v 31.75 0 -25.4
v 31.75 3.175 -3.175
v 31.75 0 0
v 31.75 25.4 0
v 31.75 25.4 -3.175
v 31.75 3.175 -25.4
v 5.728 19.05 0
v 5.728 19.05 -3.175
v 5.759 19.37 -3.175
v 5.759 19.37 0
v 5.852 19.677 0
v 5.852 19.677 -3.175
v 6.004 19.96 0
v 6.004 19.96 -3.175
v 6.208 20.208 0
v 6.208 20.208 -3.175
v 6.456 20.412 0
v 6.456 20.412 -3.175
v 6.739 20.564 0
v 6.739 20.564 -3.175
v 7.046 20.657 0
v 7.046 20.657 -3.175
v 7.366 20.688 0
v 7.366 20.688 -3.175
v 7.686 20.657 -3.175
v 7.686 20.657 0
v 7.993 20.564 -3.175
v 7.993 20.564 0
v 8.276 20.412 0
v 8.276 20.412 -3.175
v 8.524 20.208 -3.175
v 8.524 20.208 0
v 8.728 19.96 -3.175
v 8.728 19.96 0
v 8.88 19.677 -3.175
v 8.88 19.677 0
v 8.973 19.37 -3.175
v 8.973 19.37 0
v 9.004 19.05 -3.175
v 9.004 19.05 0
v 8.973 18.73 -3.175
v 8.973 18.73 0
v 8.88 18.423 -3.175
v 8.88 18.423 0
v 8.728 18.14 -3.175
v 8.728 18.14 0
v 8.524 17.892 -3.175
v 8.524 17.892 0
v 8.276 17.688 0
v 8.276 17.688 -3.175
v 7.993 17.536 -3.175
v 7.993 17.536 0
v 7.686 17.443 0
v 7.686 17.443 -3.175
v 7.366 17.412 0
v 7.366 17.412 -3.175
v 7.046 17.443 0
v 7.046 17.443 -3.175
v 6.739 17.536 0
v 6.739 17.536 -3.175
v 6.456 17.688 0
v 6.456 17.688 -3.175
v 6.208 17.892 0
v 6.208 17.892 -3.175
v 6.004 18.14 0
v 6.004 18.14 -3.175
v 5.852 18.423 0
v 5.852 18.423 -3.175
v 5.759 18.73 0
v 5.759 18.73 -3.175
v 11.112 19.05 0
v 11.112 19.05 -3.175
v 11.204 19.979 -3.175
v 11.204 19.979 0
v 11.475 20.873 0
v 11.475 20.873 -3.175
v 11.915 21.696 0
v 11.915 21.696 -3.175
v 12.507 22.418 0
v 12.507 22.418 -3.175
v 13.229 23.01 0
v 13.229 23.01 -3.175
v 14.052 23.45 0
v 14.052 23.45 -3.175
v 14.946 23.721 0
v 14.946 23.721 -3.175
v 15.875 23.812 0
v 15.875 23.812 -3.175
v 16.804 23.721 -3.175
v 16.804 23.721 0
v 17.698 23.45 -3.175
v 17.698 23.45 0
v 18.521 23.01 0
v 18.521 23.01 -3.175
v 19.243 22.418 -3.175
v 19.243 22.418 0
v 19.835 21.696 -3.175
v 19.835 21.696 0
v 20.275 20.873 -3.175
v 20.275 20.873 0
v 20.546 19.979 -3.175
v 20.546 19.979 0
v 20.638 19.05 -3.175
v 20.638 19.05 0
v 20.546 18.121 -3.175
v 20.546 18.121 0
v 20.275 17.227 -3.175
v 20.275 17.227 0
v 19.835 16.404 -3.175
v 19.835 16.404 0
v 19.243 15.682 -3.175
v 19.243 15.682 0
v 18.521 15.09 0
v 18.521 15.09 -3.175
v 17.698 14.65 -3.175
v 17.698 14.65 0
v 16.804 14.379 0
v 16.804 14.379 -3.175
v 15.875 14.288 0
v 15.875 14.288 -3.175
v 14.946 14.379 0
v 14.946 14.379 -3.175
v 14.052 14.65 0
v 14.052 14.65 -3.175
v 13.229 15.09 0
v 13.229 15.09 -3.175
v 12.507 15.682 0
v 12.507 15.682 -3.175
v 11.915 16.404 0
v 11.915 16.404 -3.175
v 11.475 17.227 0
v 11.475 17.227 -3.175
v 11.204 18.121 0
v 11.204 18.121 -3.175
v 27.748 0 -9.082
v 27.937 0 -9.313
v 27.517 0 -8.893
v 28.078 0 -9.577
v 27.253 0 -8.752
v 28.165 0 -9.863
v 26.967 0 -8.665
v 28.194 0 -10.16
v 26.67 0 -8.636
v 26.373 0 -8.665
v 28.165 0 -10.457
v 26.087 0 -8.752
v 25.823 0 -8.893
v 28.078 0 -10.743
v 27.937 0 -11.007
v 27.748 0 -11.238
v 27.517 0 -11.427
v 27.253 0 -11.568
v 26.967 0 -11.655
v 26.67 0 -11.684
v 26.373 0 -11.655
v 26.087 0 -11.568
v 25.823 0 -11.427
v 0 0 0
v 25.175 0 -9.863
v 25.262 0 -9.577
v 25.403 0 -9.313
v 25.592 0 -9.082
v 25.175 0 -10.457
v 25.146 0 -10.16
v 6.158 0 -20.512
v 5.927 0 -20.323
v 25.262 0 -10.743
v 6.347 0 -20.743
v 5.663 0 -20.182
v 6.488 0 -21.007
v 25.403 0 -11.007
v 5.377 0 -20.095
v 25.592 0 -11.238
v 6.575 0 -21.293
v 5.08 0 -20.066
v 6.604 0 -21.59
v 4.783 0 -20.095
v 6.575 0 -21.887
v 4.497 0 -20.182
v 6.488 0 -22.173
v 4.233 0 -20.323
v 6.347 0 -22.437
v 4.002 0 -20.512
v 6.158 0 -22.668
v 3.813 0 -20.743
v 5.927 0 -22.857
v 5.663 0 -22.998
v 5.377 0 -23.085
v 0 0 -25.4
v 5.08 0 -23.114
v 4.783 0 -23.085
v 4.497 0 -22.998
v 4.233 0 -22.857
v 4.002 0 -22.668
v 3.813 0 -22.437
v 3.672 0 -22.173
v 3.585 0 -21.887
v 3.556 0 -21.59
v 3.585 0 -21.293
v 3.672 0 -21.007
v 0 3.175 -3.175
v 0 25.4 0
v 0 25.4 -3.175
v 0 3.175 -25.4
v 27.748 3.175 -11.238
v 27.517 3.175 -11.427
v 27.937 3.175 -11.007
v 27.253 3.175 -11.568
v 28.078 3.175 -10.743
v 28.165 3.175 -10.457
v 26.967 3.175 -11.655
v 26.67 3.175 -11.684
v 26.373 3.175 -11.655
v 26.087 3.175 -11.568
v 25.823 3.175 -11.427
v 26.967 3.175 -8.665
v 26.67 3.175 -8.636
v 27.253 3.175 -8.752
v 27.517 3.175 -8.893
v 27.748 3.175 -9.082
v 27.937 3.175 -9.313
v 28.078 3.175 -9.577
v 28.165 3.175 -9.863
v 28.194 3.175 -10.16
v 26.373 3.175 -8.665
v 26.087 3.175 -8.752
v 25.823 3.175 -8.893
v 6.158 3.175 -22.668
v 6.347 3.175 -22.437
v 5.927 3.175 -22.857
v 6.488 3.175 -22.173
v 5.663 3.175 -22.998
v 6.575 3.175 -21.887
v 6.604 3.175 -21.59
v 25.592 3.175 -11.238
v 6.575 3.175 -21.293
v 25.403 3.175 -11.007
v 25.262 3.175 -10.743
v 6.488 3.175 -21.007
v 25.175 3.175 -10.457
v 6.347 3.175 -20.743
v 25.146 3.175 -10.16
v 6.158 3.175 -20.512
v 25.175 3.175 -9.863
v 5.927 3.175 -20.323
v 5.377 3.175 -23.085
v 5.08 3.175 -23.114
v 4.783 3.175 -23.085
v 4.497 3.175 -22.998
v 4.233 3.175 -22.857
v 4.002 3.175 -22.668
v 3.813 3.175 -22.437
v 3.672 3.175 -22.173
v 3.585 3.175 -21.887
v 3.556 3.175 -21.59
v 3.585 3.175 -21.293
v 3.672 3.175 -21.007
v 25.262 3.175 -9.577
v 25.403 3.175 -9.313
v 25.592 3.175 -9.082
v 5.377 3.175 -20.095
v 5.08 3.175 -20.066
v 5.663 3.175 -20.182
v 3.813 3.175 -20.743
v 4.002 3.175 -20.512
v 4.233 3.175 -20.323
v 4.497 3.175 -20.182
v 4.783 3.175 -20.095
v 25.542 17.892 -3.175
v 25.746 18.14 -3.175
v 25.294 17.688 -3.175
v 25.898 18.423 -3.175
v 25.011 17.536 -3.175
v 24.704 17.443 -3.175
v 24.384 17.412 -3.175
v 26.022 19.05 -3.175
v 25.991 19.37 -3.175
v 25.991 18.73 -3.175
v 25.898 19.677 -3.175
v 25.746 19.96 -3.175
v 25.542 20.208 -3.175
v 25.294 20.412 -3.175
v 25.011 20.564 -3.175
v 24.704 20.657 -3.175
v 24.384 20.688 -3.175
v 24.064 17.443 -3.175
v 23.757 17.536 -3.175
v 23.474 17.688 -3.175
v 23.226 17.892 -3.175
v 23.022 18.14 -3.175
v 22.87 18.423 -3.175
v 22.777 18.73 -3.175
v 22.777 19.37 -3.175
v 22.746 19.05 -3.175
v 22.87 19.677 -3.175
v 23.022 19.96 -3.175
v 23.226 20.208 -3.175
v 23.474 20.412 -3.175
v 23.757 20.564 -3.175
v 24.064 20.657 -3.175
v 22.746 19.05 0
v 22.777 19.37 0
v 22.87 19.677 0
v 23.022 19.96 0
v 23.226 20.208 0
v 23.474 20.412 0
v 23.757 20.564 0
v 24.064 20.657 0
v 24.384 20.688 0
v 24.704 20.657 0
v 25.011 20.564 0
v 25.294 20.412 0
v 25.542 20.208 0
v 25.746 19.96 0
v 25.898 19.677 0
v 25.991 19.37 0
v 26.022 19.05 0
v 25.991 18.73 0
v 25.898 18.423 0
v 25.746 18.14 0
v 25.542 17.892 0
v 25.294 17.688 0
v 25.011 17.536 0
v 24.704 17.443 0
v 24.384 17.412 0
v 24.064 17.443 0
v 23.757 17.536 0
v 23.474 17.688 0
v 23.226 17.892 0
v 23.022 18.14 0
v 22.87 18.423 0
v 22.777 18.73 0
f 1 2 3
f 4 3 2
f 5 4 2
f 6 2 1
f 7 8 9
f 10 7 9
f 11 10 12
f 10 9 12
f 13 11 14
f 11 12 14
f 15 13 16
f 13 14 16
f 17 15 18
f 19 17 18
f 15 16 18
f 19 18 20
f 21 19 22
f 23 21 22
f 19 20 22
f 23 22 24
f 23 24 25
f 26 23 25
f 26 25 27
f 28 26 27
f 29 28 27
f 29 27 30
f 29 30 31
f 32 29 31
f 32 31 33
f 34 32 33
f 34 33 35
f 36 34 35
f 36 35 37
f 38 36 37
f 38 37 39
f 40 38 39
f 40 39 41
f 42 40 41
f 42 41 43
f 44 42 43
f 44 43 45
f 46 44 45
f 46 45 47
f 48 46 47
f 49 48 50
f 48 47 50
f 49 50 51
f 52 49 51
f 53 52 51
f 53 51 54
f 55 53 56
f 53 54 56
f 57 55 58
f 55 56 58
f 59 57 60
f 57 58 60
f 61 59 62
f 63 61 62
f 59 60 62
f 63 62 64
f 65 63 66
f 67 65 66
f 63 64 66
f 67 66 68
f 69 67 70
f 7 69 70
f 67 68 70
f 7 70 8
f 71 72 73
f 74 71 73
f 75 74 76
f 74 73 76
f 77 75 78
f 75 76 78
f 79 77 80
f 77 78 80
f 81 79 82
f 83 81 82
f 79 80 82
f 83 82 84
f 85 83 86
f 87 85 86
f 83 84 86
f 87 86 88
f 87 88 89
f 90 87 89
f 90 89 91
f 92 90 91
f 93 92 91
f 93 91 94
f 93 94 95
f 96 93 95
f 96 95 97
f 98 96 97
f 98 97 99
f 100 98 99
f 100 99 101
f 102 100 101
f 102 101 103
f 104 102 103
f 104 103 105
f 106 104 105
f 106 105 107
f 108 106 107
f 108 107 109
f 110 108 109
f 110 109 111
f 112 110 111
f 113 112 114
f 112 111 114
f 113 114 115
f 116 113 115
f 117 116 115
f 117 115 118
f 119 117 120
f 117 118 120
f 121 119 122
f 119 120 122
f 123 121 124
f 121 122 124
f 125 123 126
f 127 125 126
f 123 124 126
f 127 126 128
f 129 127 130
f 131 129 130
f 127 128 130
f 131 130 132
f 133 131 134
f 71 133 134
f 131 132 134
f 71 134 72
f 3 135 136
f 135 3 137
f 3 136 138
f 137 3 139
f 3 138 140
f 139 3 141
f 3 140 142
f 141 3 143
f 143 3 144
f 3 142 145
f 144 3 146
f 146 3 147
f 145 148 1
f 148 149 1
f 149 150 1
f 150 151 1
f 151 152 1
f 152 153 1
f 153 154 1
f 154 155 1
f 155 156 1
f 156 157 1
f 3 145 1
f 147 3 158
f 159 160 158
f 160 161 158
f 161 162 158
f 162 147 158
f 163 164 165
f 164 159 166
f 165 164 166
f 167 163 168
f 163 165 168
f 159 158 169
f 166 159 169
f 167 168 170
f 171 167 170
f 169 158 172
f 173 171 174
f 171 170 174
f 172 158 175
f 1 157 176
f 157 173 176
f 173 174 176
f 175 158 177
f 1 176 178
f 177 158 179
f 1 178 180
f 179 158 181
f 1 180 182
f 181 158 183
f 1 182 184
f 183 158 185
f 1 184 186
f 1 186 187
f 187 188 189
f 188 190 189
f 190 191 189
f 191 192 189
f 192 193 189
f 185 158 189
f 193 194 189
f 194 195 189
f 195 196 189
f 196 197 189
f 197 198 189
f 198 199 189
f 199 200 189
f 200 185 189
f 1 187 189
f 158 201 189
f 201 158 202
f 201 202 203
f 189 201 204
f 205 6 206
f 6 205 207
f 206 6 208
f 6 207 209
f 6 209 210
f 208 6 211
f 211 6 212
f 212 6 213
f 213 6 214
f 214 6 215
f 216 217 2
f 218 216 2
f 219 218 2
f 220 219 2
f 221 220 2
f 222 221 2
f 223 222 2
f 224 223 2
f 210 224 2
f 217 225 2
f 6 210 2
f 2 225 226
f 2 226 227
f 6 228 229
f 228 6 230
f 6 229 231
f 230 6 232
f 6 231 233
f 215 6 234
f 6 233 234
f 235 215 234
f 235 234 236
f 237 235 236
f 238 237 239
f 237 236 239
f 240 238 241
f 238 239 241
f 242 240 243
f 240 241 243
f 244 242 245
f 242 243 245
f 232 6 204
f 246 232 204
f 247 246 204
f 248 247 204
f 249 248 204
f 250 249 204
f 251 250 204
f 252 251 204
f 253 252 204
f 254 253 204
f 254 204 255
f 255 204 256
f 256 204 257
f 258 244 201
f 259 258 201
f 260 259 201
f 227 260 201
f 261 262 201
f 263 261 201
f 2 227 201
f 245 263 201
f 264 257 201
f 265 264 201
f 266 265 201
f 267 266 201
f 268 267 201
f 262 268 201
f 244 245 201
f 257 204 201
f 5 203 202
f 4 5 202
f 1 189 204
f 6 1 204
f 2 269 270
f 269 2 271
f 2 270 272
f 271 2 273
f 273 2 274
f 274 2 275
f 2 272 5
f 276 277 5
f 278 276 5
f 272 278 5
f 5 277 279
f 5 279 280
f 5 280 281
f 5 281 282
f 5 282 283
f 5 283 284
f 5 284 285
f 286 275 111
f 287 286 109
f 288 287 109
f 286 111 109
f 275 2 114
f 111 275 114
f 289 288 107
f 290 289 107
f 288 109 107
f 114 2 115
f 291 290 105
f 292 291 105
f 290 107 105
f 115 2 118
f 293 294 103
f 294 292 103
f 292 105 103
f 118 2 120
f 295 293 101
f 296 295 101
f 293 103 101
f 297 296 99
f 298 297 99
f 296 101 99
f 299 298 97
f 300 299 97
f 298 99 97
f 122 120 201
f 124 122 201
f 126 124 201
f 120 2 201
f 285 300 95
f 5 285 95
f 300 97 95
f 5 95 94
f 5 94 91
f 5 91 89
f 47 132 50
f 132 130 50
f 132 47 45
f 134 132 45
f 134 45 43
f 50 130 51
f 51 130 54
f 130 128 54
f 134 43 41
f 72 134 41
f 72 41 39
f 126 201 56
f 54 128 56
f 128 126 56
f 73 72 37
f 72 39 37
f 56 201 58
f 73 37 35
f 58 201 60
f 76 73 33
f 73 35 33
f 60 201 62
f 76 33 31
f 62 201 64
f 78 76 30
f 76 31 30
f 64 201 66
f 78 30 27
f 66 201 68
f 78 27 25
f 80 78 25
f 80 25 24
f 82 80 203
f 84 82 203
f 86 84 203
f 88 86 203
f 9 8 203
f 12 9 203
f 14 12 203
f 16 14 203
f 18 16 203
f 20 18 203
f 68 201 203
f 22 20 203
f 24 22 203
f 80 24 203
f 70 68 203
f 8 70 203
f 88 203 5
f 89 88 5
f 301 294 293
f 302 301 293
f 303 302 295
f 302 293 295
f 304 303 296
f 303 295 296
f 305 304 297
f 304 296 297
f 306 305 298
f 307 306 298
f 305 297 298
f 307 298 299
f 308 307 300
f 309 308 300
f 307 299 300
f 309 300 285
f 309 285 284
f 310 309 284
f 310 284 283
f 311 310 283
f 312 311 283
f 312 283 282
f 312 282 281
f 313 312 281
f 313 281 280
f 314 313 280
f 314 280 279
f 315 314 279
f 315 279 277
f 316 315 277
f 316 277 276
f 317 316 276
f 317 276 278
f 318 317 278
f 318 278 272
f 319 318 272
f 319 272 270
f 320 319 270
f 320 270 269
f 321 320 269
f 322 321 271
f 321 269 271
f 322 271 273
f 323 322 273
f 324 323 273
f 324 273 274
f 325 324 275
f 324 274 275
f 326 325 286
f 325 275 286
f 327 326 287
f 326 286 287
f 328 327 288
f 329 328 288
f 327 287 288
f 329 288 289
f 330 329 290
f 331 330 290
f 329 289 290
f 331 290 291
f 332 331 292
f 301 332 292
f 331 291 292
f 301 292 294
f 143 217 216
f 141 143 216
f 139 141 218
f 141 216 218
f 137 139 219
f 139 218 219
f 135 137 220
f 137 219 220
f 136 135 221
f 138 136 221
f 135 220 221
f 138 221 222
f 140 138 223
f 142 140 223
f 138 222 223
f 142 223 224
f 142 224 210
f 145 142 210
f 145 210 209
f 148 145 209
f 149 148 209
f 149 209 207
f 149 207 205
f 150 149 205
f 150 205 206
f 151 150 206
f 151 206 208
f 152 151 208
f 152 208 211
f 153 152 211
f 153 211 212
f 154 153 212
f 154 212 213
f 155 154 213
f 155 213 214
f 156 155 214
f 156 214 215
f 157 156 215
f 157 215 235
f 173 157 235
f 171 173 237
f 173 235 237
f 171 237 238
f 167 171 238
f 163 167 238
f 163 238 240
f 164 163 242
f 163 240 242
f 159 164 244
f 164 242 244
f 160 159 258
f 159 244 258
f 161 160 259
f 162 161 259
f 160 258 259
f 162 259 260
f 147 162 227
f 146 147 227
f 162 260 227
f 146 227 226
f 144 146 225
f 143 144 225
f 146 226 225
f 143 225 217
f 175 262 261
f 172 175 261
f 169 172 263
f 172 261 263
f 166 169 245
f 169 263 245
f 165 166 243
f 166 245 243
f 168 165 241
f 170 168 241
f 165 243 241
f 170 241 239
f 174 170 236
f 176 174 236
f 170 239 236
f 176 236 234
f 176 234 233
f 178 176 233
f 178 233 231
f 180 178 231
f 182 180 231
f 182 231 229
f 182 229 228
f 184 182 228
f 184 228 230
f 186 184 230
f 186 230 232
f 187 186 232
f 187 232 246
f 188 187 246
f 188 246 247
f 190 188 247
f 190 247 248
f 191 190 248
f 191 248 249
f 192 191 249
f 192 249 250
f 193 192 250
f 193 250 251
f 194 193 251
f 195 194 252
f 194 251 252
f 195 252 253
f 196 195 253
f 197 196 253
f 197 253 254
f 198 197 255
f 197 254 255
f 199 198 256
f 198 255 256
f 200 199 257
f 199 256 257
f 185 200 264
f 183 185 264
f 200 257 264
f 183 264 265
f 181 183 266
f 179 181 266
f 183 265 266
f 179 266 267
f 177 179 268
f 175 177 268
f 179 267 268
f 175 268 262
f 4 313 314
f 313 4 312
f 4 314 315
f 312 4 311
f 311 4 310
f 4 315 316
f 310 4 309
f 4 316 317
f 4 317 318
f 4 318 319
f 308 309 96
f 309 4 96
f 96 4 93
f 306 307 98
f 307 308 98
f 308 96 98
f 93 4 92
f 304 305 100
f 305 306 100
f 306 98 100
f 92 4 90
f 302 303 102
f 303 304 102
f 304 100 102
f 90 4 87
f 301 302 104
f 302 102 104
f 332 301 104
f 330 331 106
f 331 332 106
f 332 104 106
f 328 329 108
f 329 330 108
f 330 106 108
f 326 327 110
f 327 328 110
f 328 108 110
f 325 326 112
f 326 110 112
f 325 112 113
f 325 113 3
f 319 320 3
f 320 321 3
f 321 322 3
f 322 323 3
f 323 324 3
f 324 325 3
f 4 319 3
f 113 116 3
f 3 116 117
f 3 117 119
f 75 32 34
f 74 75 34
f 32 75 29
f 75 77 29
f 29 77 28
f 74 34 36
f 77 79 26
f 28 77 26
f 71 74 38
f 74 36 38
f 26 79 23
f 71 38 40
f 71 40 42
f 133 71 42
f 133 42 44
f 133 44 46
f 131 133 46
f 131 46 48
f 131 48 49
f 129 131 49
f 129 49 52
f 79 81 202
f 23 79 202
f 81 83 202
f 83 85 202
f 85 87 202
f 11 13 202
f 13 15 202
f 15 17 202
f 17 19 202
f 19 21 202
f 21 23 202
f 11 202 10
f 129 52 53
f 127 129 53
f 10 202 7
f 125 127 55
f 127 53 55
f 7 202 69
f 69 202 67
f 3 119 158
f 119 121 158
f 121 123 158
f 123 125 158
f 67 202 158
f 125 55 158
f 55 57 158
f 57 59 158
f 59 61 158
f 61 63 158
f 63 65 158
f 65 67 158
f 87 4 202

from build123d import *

# Parameters (mm, degrees)
BOSS_EXTRUDE1_DEPTH = 31.75
SKETCH3_R           = 4.7625
SKETCH3_R_2         = 1.6383
CUT_EXTRUDE1_DEPTH  = 47.337599474
SKETCH4_R           = 1.524
CUT_EXTRUDE2_DEPTH  = 47.337599474


with BuildPart() as part:
    # Sketch2 → Boss-Extrude1 (new body)
    with BuildSketch(Plane(origin=(0, 0, 0), x_dir=(0, 0, -1), z_dir=(1, 0, 0))):
        Polygon((0, 0), (25.4, 0), (25.4, 3.175), (3.175, 3.175), (3.175, 25.4), (0, 25.4), align=None)
    extrude(amount=BOSS_EXTRUDE1_DEPTH)

    # Sketch3 → Cut-Extrude1 (cut, through all)
    with BuildSketch(Plane(origin=(0, 0, -3.175), x_dir=(-1, 0, 0), z_dir=(0, 0, -1))):
        with Locations((-15.875, 19.05)):
            Circle(SKETCH3_R)
        with Locations((-7.366, 19.05)):
            Circle(SKETCH3_R_2)
        with Locations((-24.384, 19.05)):
            Circle(SKETCH3_R_2)
    extrude(amount=-CUT_EXTRUDE1_DEPTH, mode=Mode.SUBTRACT)

    # Sketch4 → Cut-Extrude2 (cut, through all)
    with BuildSketch(Plane(origin=(0, 3.175, 0), x_dir=(1, 0, 0), z_dir=(0, 1, 0))):
        with Locations(Location((5.08, 21.59, 0), (0, 0, 270))):
            Circle(SKETCH4_R)
        with Locations(Location((26.67, 10.16, 0), (0, 0, 270))):
            Circle(SKETCH4_R)
    extrude(amount=-CUT_EXTRUDE2_DEPTH, mode=Mode.SUBTRACT)


solid = part.part
